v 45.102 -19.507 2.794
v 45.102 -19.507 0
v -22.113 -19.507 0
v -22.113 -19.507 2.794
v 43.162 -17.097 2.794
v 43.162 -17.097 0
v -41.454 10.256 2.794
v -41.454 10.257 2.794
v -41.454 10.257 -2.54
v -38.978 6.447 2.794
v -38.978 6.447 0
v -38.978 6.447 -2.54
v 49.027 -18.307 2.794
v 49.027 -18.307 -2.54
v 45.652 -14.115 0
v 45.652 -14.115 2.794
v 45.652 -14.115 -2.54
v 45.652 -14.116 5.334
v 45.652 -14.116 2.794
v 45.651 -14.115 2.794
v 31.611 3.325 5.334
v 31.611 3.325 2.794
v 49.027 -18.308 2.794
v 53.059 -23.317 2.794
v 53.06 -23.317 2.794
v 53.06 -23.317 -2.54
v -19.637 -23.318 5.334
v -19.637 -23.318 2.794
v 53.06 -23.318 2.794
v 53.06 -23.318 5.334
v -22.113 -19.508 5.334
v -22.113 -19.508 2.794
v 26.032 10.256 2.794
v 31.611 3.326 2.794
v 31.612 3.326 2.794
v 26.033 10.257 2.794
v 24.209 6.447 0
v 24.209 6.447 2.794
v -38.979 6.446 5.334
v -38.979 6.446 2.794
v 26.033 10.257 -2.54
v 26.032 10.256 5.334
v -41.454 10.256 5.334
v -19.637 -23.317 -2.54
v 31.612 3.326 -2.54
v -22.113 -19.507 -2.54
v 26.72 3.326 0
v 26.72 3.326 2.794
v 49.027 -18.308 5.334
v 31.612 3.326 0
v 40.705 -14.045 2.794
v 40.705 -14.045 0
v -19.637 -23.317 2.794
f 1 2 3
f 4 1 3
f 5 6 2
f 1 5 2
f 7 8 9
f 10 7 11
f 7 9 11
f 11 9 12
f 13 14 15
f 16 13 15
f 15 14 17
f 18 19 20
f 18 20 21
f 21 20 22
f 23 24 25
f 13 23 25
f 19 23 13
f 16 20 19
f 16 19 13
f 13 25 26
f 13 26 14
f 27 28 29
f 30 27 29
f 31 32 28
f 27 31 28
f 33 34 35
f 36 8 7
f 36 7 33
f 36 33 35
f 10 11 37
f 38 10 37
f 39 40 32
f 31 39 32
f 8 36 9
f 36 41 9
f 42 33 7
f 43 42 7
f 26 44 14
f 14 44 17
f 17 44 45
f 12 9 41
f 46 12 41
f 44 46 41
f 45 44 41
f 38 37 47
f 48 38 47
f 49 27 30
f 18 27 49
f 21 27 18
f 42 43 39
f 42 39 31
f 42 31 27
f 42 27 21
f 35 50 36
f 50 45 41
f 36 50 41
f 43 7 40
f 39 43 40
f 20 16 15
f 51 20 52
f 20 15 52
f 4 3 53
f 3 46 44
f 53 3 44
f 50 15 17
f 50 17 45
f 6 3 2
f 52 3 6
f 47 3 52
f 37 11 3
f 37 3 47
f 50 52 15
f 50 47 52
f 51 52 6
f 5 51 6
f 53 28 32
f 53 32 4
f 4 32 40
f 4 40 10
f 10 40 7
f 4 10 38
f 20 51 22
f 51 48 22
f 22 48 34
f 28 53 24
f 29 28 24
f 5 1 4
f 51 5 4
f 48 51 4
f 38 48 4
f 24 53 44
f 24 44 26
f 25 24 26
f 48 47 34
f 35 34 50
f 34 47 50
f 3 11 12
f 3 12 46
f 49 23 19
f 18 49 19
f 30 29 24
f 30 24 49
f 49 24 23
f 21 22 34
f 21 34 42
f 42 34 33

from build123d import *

# Parameters (mm, degrees)
F1_DEPTH = 2.54
F2_DEPTH = 2.794
F5_DEPTH = 2.54


# Not quite as in the source:
# - ends of sketch curves that miss each other by under 0.0002 mm in the source are joined


with BuildPart() as f1:
    # F0 (on Top) → F1 (new body)
    with BuildSketch(Plane.XY):
        Polygon((40.704589831, -14.0446320264), (45.6521262704, -14.1146421426), (31.6115576886, 3.3264026483), (26.7203815156, 3.3264026483), (24.2085343305, 6.4465921843), (-38.9784165732, 6.4465921843), (-22.1132018277, -19.5065848529), (45.1016274707, -19.5065848529), (43.1621550999, -17.0973931503), align=None)
        Polygon((26.7203815156, 3.3264026483), (31.6115576886, 3.3264026483), (26.0325449788, 10.2565921843), (-41.4542779326, 10.2565921843), (-38.9784165732, 6.4465921843), (24.2085343305, 6.4465921843), align=None)
        Polygon((53.0599689064, -23.3165845275), (49.0268522152, -18.3066903858), (45.6521262704, -14.1146421426), (40.704589831, -14.0446320264), (43.1621550999, -17.0973931503), (45.1016274707, -19.5065848529), (-22.1132018277, -19.5065848529), (-19.6373406798, -23.3165845275), align=None)
    extrude(amount=-F1_DEPTH)

    # F0 (on Top) → F2 (join)
    with BuildSketch(Plane.XY):
        Polygon((26.7203815156, 3.3264026483), (31.6115576886, 3.3264026483), (26.0325449788, 10.2565921843), (-41.4542779326, 10.2565921843), (-38.9784165732, 6.4465921843), (24.2085343305, 6.4465921843), align=None)
        Polygon((53.0599689064, -23.3165845275), (49.0268522152, -18.3066903858), (45.6521262704, -14.1146421426), (40.704589831, -14.0446320264), (43.1621550999, -17.0973931503), (45.1016274707, -19.5065848529), (-22.1132018277, -19.5065848529), (-19.6373406798, -23.3165845275), align=None)
    extrude(amount=F2_DEPTH)

    # F4 (on offset) → F5 (join)
    with BuildSketch(Plane.XY.offset(2.794)):
        Polygon((53.0598776368, -23.3175773174), (49.0267609456, -18.3076831757), (45.6520350008, -14.1156349324), (40.7044985614, -14.0456248163), (43.1620638303, -17.0983859402), (45.101536201, -19.5075776428), (-22.1132930973, -19.5075776428), (-19.6374319494, -23.3175773174), align=None)
        Polygon((40.7044985614, -14.0456248163), (45.6520350008, -14.1156349324), (31.611466419, 3.3254098585), (26.720290246, 3.3254098585), (24.2084430609, 6.4455993944), (-38.9785078428, 6.4455993944), (-22.1132930973, -19.5075776428), (45.101536201, -19.5075776428), (43.1620638303, -17.0983859402), align=None)
        Polygon((26.720290246, 3.3254098585), (31.611466419, 3.3254098585), (26.0324537092, 10.2555993944), (-41.4543692023, 10.2555993944), (-38.9785078428, 6.4455993944), (24.2084430609, 6.4455993944), align=None)
    extrude(amount=F5_DEPTH)


solid = f1.part
